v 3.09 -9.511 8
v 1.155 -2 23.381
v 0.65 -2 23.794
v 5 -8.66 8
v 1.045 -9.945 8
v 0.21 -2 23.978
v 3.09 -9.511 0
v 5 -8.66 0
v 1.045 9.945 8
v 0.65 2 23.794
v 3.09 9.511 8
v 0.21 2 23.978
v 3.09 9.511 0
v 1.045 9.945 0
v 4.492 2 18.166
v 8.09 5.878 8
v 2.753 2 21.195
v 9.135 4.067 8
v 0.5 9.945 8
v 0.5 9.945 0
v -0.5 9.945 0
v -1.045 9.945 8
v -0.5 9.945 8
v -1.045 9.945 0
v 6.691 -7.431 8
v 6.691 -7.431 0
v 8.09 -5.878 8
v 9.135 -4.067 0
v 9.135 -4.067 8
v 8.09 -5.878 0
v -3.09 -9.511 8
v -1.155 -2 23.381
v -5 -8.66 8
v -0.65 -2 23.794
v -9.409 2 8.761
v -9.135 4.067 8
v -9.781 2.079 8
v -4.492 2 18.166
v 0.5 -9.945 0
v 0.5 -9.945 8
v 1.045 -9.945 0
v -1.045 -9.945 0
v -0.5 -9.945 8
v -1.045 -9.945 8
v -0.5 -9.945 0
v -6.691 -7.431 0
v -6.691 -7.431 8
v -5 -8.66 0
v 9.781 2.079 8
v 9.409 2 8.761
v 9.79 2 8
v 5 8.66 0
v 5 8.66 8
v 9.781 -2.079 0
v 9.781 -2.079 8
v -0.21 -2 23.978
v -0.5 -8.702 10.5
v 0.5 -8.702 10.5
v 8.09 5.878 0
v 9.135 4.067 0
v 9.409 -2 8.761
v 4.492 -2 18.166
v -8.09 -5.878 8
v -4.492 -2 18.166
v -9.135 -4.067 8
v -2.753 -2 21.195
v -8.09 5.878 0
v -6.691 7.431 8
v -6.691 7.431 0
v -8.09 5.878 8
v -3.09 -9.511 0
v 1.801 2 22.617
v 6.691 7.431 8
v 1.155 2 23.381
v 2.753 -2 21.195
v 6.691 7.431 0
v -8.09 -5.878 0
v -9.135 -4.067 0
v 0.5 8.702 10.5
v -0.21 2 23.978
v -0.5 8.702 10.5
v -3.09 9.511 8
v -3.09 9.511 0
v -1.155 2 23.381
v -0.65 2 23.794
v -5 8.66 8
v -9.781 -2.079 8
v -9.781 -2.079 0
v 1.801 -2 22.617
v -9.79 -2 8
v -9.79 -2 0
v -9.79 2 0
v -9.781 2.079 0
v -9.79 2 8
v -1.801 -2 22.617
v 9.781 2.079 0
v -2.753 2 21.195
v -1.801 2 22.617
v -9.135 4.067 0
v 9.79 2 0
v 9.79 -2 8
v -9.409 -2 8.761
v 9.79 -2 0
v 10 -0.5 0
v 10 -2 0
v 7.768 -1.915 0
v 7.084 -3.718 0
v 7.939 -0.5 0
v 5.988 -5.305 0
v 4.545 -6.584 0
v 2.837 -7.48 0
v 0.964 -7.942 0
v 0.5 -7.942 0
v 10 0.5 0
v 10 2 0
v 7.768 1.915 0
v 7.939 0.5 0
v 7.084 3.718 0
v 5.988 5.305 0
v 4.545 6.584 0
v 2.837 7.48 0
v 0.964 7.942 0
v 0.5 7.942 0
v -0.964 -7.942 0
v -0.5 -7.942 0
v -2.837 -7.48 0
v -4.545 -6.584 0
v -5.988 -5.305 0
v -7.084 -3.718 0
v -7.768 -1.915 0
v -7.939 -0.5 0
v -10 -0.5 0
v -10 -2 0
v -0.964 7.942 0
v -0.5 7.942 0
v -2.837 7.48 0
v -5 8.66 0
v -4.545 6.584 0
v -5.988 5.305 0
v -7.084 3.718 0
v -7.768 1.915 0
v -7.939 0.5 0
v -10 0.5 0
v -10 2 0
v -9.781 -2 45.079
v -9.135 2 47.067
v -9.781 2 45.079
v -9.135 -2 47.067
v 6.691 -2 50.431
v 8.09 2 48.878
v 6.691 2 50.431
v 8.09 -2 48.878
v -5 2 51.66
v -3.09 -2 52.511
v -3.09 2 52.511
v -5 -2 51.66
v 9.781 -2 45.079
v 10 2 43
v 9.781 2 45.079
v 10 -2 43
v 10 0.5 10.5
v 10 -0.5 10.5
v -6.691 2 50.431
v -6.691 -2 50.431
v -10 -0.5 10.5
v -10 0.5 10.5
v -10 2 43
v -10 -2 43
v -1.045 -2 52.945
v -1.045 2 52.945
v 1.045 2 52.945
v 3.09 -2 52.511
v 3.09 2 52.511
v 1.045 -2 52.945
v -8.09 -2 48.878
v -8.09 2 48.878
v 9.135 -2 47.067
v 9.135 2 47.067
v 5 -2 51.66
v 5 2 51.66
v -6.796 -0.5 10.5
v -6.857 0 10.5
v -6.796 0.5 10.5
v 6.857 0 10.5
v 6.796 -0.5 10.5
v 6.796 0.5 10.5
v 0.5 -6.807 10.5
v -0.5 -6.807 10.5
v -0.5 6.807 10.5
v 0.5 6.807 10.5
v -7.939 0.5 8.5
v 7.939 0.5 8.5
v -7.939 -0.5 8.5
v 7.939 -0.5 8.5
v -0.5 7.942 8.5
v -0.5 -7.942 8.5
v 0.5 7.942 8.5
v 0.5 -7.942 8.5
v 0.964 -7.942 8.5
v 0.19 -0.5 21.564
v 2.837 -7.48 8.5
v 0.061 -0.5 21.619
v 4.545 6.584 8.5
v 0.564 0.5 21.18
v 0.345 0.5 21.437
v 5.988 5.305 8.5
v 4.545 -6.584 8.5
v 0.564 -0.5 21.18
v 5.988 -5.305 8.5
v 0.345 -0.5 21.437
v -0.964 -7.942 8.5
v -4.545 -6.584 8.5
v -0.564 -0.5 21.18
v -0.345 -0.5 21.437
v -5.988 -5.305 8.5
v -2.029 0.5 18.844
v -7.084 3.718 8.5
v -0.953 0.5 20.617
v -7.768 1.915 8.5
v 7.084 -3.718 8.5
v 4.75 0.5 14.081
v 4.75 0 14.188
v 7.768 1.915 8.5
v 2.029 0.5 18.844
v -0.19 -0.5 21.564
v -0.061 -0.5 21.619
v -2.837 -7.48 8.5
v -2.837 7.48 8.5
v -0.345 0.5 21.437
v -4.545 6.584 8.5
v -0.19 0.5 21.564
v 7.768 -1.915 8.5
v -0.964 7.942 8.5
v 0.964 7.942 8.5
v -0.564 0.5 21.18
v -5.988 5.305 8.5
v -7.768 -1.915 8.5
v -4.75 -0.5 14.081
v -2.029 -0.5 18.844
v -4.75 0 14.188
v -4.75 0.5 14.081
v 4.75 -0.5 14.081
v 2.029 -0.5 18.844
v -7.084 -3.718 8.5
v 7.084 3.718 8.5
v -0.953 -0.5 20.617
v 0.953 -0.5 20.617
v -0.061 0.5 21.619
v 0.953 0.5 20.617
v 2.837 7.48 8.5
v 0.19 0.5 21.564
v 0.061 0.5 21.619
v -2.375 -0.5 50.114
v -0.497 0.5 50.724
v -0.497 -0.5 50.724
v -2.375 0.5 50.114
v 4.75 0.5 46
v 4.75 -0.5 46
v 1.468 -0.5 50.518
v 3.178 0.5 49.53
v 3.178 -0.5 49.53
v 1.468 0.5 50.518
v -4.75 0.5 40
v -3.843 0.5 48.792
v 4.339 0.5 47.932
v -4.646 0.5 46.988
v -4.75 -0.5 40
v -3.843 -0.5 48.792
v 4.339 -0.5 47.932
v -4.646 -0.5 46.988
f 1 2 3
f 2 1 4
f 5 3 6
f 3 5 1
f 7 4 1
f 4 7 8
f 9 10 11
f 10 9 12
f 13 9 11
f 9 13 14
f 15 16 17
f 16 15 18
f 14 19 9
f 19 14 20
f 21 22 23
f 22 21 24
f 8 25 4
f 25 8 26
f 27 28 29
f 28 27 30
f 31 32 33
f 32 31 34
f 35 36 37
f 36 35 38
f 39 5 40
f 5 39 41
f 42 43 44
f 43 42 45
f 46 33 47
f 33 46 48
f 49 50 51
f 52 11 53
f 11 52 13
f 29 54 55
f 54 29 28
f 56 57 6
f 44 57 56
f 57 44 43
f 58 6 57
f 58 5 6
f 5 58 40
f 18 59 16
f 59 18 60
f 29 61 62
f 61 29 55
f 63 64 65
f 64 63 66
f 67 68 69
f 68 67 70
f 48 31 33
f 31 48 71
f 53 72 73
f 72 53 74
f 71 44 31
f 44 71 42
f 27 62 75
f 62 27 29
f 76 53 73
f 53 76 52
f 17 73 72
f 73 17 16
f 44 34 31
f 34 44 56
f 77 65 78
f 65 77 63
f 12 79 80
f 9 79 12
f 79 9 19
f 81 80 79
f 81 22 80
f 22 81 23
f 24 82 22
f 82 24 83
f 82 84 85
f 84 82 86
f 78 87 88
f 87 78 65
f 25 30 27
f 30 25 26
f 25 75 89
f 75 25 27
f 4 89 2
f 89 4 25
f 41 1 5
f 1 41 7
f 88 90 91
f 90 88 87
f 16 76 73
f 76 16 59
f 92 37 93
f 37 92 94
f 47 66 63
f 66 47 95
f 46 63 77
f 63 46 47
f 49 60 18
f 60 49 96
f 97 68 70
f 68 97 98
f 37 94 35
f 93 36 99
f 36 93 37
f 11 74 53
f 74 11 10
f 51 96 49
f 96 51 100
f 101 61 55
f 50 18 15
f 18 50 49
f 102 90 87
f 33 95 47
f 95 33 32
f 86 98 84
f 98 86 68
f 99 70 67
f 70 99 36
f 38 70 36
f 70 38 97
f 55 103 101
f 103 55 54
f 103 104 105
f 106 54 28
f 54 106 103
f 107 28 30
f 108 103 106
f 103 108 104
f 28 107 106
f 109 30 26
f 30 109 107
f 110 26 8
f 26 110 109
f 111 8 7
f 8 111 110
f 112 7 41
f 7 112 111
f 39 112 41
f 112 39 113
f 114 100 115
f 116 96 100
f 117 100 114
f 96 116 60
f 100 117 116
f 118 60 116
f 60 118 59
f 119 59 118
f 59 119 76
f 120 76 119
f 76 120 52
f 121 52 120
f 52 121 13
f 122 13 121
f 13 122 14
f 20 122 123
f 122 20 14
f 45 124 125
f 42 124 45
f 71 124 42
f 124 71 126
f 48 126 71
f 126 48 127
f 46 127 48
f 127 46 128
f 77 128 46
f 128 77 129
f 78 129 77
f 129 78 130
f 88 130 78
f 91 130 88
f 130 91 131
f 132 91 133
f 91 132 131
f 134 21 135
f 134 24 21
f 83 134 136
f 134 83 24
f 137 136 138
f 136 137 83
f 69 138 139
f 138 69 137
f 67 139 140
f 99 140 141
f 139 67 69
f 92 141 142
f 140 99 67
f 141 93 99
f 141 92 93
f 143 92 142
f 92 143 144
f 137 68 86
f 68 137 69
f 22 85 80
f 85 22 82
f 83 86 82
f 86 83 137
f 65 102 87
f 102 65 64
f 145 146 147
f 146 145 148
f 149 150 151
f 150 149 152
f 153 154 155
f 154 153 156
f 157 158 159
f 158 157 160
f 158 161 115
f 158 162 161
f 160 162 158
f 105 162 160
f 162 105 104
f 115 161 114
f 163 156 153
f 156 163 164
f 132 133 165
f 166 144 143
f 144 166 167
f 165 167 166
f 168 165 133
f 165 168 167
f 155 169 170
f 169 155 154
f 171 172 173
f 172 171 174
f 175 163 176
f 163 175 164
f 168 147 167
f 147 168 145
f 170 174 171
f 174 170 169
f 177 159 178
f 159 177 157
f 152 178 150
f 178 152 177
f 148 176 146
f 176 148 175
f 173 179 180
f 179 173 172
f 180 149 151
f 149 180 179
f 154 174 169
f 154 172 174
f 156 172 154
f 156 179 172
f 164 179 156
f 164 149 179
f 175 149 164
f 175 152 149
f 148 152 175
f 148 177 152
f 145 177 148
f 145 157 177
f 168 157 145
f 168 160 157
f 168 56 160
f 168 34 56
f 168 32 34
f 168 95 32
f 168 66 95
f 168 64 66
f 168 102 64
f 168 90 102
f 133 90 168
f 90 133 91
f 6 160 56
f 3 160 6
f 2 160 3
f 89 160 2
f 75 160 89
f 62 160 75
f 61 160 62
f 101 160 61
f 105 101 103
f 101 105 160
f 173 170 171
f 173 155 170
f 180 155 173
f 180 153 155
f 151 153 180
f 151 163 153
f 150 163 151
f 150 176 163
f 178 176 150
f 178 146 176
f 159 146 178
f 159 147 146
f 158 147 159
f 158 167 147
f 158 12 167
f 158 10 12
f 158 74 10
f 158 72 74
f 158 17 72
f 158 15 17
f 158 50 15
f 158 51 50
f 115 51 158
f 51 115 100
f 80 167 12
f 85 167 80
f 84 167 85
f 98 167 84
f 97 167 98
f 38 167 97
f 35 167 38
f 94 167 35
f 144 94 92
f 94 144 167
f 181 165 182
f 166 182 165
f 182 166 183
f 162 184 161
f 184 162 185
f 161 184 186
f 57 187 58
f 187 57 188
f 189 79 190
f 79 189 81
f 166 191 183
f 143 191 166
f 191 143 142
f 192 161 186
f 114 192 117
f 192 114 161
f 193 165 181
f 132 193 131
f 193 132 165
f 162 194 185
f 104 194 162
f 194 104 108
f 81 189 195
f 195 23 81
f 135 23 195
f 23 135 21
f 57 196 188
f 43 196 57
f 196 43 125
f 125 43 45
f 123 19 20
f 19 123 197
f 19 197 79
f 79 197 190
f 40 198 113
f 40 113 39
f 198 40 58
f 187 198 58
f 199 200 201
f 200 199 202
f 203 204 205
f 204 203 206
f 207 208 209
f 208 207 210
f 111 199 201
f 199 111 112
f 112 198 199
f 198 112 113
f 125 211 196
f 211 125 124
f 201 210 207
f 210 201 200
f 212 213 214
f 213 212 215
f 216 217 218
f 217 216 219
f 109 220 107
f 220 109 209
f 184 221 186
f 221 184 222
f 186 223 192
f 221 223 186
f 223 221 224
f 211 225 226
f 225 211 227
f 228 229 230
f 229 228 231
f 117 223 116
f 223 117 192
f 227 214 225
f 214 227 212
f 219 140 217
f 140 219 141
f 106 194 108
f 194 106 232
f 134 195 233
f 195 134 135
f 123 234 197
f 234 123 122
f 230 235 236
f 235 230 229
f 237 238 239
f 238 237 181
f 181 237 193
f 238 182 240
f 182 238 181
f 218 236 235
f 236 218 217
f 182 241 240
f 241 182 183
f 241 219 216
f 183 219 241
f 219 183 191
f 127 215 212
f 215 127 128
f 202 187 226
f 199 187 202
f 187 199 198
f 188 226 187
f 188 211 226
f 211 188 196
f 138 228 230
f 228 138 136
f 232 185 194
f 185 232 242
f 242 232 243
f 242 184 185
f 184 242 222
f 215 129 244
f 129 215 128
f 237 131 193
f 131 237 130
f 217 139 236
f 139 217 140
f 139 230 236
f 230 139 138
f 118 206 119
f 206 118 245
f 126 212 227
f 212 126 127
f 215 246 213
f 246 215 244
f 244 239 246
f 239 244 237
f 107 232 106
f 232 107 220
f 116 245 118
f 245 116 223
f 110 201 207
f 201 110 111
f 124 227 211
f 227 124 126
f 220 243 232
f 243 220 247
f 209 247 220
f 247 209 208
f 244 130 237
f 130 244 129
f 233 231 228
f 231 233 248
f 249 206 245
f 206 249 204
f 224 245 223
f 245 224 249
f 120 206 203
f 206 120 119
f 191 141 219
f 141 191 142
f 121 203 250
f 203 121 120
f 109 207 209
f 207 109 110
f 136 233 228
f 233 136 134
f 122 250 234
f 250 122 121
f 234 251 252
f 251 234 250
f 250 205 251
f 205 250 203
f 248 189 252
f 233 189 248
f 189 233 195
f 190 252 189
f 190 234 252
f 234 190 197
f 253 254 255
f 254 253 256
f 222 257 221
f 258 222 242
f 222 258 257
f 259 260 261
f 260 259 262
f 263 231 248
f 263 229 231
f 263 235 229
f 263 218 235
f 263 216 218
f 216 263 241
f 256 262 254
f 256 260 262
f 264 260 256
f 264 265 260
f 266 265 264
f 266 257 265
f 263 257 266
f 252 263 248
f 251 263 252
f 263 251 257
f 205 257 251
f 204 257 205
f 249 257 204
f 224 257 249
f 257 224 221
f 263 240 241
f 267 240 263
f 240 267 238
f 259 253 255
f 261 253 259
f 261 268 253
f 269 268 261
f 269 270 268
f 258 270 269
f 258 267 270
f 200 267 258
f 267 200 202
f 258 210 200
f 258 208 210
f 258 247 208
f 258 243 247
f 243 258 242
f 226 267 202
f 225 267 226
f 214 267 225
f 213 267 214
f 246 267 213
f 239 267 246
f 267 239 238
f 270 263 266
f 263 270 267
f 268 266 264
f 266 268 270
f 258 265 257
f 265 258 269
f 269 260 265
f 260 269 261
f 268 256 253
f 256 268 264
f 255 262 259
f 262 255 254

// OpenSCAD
base_h = 16;
base_r = 8;

blade_h = 38;
blade_w = 0.9;
blade_d = 8.5;

blade_space_h = blade_h + 2;
blade_space_w = 1;
blade_space_d = blade_d + 1;

relief = (base_r + 4) * 2;

//rotate([0, 90, 0])
difference() {

    // the exterior shape
    union() {

        // base and taper
        hull() {
            cylinder(1, base_r + 2, base_r + 2);
            translate([0, 0, 8]) {
                cylinder(20, base_r + 2, 0);
            };
        };

        // blade sheath
        hull() {
            translate([-10, -2, 0]) {
                cube([20, 4, blade_h - 24]);
            };
            translate([0, 2, base_h + blade_h - 11]) {
                rotate([90, 0, 0]) {
                    cylinder(4, base_r + 2, base_r + 2);
                };
            };
        };
    };


    // relief slots
    translate([-relief / 2, -0.5, -0.5]) {
        cube([relief, 1, 11]);
    };
    rotate([0, 0, 90])
    translate([-relief / 2, -0.5, -0.5]) {
        cube([relief, 1, 11]);
    };


    // interior taper
    translate([0, 0, -0.5]) {
        hull() {
            cylinder(base_h-8, base_r, base_r);
            translate([0, 0, 9]) {
                cylinder(14, base_r, 0);
            };
        };
    };


    // blade slot
    translate([0, 0, -2]) {
    hull() {
        translate([-blade_space_d / 2, -0.5, 10]) {
            cube([blade_space_d, 1, blade_h - 6]);
        };
        translate([0, 0.5, base_h + blade_h - 6]) {
            rotate([90, 0, 0]) {
                cylinder(1, blade_space_d/2, blade_space_d/2);
            };
        };
    };
    };
};
